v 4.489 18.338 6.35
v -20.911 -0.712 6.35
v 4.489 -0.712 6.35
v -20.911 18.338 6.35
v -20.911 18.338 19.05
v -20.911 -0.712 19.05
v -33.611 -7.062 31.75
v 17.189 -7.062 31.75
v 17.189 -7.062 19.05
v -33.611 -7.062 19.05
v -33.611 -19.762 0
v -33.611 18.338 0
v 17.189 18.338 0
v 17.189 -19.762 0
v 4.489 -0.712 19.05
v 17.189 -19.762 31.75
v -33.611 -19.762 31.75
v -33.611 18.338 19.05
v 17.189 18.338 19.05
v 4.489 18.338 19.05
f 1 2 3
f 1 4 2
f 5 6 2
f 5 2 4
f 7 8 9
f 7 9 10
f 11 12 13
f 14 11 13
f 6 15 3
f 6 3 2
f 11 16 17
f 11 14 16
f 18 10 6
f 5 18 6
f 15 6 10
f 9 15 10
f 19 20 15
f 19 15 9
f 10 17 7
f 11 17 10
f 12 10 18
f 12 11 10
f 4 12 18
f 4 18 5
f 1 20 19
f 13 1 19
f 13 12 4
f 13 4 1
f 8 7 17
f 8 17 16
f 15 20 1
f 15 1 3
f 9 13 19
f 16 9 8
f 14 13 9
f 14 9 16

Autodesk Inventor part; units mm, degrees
ref_plane "YZ Plane" through (0, 0, 0) normal (1, 0, 0) x (0, 1, 0)
ref_plane "XZ Plane" through (0, 0, 0) normal (0, 1, 0) x (-1, 0, 0)
ref_plane "XY Plane" through (0, 0, 0) normal (0, 0, 1) x (1, 0, 0)
sketch "Sketch1" plane through (0, 0, 0) normal (0, 0, 1) x (1, 0, 0)
  line L0 (-33.6112, 18.3384) -> (17.1888, 18.3384)
  line L1 (17.1888, 18.3384) -> (17.1888, -19.7616)
  line L2 (17.1888, -19.7616) -> (-33.6112, -19.7616)
  line L3 (-33.6112, -19.7616) -> (-33.6112, 18.3384)
  point P0 (0, 0)
  dimension "d0" = 50.8
  dimension "d1" = 38.1
extrude "Extrusion1" add sketch "Sketch1" along normal blind 31.75
sketch "Sketch2" plane through (0, 0, 31.75) normal (0, 0, 1) x (1, 0, 0)
  line L0 (17.1888, 18.3384) -> (-33.6112, 18.3384) projected
  line L1 (17.1888, -19.7616) -> (17.1888, 18.3384) projected
  line L2 (-33.6112, 18.3384) -> (17.1888, 18.3384)
  line L3 (17.1888, 18.3384) -> (17.1888, -7.0616)
  line L4 (17.1888, -7.0616) -> (-33.6112, -7.0616)
  line L5 (-33.6112, -7.0616) -> (-33.6112, 18.3384)
  line L6 (17.1888, -19.7616) -> (-33.6112, -19.7616) projected
  point P0 (0, 0)
  dimension "d4" = 12.7
extrude "Extrusion2" cut sketch "Sketch2" against normal blind 12.7
sketch "Sketch3" plane through (0, 0, 19.05) normal (0, 0, 1) x (1, 0, 0)
  line L0 (-33.6112, 18.3384) -> (17.1888, 18.3384) projected
  line L1 (-20.9112, 18.3384) -> (4.4888, 18.3384)
  line L2 (4.4888, 18.3384) -> (4.4888, -0.7116)
  line L3 (4.4888, -0.7116) -> (-20.9112, -0.7116)
  line L4 (-20.9112, -0.7116) -> (-20.9112, 18.3384)
  line L5 (17.1888, 18.3384) -> (17.1888, -7.0616) projected
  point P0 (0, 0)
  dimension "d7" = 25.4
  dimension "d8" = 12.7
  dimension "d9" = 19.05
extrude "Extrusion3" cut sketch "Sketch3" against normal blind 12.7
properties part number "Figure 7_27_6"
